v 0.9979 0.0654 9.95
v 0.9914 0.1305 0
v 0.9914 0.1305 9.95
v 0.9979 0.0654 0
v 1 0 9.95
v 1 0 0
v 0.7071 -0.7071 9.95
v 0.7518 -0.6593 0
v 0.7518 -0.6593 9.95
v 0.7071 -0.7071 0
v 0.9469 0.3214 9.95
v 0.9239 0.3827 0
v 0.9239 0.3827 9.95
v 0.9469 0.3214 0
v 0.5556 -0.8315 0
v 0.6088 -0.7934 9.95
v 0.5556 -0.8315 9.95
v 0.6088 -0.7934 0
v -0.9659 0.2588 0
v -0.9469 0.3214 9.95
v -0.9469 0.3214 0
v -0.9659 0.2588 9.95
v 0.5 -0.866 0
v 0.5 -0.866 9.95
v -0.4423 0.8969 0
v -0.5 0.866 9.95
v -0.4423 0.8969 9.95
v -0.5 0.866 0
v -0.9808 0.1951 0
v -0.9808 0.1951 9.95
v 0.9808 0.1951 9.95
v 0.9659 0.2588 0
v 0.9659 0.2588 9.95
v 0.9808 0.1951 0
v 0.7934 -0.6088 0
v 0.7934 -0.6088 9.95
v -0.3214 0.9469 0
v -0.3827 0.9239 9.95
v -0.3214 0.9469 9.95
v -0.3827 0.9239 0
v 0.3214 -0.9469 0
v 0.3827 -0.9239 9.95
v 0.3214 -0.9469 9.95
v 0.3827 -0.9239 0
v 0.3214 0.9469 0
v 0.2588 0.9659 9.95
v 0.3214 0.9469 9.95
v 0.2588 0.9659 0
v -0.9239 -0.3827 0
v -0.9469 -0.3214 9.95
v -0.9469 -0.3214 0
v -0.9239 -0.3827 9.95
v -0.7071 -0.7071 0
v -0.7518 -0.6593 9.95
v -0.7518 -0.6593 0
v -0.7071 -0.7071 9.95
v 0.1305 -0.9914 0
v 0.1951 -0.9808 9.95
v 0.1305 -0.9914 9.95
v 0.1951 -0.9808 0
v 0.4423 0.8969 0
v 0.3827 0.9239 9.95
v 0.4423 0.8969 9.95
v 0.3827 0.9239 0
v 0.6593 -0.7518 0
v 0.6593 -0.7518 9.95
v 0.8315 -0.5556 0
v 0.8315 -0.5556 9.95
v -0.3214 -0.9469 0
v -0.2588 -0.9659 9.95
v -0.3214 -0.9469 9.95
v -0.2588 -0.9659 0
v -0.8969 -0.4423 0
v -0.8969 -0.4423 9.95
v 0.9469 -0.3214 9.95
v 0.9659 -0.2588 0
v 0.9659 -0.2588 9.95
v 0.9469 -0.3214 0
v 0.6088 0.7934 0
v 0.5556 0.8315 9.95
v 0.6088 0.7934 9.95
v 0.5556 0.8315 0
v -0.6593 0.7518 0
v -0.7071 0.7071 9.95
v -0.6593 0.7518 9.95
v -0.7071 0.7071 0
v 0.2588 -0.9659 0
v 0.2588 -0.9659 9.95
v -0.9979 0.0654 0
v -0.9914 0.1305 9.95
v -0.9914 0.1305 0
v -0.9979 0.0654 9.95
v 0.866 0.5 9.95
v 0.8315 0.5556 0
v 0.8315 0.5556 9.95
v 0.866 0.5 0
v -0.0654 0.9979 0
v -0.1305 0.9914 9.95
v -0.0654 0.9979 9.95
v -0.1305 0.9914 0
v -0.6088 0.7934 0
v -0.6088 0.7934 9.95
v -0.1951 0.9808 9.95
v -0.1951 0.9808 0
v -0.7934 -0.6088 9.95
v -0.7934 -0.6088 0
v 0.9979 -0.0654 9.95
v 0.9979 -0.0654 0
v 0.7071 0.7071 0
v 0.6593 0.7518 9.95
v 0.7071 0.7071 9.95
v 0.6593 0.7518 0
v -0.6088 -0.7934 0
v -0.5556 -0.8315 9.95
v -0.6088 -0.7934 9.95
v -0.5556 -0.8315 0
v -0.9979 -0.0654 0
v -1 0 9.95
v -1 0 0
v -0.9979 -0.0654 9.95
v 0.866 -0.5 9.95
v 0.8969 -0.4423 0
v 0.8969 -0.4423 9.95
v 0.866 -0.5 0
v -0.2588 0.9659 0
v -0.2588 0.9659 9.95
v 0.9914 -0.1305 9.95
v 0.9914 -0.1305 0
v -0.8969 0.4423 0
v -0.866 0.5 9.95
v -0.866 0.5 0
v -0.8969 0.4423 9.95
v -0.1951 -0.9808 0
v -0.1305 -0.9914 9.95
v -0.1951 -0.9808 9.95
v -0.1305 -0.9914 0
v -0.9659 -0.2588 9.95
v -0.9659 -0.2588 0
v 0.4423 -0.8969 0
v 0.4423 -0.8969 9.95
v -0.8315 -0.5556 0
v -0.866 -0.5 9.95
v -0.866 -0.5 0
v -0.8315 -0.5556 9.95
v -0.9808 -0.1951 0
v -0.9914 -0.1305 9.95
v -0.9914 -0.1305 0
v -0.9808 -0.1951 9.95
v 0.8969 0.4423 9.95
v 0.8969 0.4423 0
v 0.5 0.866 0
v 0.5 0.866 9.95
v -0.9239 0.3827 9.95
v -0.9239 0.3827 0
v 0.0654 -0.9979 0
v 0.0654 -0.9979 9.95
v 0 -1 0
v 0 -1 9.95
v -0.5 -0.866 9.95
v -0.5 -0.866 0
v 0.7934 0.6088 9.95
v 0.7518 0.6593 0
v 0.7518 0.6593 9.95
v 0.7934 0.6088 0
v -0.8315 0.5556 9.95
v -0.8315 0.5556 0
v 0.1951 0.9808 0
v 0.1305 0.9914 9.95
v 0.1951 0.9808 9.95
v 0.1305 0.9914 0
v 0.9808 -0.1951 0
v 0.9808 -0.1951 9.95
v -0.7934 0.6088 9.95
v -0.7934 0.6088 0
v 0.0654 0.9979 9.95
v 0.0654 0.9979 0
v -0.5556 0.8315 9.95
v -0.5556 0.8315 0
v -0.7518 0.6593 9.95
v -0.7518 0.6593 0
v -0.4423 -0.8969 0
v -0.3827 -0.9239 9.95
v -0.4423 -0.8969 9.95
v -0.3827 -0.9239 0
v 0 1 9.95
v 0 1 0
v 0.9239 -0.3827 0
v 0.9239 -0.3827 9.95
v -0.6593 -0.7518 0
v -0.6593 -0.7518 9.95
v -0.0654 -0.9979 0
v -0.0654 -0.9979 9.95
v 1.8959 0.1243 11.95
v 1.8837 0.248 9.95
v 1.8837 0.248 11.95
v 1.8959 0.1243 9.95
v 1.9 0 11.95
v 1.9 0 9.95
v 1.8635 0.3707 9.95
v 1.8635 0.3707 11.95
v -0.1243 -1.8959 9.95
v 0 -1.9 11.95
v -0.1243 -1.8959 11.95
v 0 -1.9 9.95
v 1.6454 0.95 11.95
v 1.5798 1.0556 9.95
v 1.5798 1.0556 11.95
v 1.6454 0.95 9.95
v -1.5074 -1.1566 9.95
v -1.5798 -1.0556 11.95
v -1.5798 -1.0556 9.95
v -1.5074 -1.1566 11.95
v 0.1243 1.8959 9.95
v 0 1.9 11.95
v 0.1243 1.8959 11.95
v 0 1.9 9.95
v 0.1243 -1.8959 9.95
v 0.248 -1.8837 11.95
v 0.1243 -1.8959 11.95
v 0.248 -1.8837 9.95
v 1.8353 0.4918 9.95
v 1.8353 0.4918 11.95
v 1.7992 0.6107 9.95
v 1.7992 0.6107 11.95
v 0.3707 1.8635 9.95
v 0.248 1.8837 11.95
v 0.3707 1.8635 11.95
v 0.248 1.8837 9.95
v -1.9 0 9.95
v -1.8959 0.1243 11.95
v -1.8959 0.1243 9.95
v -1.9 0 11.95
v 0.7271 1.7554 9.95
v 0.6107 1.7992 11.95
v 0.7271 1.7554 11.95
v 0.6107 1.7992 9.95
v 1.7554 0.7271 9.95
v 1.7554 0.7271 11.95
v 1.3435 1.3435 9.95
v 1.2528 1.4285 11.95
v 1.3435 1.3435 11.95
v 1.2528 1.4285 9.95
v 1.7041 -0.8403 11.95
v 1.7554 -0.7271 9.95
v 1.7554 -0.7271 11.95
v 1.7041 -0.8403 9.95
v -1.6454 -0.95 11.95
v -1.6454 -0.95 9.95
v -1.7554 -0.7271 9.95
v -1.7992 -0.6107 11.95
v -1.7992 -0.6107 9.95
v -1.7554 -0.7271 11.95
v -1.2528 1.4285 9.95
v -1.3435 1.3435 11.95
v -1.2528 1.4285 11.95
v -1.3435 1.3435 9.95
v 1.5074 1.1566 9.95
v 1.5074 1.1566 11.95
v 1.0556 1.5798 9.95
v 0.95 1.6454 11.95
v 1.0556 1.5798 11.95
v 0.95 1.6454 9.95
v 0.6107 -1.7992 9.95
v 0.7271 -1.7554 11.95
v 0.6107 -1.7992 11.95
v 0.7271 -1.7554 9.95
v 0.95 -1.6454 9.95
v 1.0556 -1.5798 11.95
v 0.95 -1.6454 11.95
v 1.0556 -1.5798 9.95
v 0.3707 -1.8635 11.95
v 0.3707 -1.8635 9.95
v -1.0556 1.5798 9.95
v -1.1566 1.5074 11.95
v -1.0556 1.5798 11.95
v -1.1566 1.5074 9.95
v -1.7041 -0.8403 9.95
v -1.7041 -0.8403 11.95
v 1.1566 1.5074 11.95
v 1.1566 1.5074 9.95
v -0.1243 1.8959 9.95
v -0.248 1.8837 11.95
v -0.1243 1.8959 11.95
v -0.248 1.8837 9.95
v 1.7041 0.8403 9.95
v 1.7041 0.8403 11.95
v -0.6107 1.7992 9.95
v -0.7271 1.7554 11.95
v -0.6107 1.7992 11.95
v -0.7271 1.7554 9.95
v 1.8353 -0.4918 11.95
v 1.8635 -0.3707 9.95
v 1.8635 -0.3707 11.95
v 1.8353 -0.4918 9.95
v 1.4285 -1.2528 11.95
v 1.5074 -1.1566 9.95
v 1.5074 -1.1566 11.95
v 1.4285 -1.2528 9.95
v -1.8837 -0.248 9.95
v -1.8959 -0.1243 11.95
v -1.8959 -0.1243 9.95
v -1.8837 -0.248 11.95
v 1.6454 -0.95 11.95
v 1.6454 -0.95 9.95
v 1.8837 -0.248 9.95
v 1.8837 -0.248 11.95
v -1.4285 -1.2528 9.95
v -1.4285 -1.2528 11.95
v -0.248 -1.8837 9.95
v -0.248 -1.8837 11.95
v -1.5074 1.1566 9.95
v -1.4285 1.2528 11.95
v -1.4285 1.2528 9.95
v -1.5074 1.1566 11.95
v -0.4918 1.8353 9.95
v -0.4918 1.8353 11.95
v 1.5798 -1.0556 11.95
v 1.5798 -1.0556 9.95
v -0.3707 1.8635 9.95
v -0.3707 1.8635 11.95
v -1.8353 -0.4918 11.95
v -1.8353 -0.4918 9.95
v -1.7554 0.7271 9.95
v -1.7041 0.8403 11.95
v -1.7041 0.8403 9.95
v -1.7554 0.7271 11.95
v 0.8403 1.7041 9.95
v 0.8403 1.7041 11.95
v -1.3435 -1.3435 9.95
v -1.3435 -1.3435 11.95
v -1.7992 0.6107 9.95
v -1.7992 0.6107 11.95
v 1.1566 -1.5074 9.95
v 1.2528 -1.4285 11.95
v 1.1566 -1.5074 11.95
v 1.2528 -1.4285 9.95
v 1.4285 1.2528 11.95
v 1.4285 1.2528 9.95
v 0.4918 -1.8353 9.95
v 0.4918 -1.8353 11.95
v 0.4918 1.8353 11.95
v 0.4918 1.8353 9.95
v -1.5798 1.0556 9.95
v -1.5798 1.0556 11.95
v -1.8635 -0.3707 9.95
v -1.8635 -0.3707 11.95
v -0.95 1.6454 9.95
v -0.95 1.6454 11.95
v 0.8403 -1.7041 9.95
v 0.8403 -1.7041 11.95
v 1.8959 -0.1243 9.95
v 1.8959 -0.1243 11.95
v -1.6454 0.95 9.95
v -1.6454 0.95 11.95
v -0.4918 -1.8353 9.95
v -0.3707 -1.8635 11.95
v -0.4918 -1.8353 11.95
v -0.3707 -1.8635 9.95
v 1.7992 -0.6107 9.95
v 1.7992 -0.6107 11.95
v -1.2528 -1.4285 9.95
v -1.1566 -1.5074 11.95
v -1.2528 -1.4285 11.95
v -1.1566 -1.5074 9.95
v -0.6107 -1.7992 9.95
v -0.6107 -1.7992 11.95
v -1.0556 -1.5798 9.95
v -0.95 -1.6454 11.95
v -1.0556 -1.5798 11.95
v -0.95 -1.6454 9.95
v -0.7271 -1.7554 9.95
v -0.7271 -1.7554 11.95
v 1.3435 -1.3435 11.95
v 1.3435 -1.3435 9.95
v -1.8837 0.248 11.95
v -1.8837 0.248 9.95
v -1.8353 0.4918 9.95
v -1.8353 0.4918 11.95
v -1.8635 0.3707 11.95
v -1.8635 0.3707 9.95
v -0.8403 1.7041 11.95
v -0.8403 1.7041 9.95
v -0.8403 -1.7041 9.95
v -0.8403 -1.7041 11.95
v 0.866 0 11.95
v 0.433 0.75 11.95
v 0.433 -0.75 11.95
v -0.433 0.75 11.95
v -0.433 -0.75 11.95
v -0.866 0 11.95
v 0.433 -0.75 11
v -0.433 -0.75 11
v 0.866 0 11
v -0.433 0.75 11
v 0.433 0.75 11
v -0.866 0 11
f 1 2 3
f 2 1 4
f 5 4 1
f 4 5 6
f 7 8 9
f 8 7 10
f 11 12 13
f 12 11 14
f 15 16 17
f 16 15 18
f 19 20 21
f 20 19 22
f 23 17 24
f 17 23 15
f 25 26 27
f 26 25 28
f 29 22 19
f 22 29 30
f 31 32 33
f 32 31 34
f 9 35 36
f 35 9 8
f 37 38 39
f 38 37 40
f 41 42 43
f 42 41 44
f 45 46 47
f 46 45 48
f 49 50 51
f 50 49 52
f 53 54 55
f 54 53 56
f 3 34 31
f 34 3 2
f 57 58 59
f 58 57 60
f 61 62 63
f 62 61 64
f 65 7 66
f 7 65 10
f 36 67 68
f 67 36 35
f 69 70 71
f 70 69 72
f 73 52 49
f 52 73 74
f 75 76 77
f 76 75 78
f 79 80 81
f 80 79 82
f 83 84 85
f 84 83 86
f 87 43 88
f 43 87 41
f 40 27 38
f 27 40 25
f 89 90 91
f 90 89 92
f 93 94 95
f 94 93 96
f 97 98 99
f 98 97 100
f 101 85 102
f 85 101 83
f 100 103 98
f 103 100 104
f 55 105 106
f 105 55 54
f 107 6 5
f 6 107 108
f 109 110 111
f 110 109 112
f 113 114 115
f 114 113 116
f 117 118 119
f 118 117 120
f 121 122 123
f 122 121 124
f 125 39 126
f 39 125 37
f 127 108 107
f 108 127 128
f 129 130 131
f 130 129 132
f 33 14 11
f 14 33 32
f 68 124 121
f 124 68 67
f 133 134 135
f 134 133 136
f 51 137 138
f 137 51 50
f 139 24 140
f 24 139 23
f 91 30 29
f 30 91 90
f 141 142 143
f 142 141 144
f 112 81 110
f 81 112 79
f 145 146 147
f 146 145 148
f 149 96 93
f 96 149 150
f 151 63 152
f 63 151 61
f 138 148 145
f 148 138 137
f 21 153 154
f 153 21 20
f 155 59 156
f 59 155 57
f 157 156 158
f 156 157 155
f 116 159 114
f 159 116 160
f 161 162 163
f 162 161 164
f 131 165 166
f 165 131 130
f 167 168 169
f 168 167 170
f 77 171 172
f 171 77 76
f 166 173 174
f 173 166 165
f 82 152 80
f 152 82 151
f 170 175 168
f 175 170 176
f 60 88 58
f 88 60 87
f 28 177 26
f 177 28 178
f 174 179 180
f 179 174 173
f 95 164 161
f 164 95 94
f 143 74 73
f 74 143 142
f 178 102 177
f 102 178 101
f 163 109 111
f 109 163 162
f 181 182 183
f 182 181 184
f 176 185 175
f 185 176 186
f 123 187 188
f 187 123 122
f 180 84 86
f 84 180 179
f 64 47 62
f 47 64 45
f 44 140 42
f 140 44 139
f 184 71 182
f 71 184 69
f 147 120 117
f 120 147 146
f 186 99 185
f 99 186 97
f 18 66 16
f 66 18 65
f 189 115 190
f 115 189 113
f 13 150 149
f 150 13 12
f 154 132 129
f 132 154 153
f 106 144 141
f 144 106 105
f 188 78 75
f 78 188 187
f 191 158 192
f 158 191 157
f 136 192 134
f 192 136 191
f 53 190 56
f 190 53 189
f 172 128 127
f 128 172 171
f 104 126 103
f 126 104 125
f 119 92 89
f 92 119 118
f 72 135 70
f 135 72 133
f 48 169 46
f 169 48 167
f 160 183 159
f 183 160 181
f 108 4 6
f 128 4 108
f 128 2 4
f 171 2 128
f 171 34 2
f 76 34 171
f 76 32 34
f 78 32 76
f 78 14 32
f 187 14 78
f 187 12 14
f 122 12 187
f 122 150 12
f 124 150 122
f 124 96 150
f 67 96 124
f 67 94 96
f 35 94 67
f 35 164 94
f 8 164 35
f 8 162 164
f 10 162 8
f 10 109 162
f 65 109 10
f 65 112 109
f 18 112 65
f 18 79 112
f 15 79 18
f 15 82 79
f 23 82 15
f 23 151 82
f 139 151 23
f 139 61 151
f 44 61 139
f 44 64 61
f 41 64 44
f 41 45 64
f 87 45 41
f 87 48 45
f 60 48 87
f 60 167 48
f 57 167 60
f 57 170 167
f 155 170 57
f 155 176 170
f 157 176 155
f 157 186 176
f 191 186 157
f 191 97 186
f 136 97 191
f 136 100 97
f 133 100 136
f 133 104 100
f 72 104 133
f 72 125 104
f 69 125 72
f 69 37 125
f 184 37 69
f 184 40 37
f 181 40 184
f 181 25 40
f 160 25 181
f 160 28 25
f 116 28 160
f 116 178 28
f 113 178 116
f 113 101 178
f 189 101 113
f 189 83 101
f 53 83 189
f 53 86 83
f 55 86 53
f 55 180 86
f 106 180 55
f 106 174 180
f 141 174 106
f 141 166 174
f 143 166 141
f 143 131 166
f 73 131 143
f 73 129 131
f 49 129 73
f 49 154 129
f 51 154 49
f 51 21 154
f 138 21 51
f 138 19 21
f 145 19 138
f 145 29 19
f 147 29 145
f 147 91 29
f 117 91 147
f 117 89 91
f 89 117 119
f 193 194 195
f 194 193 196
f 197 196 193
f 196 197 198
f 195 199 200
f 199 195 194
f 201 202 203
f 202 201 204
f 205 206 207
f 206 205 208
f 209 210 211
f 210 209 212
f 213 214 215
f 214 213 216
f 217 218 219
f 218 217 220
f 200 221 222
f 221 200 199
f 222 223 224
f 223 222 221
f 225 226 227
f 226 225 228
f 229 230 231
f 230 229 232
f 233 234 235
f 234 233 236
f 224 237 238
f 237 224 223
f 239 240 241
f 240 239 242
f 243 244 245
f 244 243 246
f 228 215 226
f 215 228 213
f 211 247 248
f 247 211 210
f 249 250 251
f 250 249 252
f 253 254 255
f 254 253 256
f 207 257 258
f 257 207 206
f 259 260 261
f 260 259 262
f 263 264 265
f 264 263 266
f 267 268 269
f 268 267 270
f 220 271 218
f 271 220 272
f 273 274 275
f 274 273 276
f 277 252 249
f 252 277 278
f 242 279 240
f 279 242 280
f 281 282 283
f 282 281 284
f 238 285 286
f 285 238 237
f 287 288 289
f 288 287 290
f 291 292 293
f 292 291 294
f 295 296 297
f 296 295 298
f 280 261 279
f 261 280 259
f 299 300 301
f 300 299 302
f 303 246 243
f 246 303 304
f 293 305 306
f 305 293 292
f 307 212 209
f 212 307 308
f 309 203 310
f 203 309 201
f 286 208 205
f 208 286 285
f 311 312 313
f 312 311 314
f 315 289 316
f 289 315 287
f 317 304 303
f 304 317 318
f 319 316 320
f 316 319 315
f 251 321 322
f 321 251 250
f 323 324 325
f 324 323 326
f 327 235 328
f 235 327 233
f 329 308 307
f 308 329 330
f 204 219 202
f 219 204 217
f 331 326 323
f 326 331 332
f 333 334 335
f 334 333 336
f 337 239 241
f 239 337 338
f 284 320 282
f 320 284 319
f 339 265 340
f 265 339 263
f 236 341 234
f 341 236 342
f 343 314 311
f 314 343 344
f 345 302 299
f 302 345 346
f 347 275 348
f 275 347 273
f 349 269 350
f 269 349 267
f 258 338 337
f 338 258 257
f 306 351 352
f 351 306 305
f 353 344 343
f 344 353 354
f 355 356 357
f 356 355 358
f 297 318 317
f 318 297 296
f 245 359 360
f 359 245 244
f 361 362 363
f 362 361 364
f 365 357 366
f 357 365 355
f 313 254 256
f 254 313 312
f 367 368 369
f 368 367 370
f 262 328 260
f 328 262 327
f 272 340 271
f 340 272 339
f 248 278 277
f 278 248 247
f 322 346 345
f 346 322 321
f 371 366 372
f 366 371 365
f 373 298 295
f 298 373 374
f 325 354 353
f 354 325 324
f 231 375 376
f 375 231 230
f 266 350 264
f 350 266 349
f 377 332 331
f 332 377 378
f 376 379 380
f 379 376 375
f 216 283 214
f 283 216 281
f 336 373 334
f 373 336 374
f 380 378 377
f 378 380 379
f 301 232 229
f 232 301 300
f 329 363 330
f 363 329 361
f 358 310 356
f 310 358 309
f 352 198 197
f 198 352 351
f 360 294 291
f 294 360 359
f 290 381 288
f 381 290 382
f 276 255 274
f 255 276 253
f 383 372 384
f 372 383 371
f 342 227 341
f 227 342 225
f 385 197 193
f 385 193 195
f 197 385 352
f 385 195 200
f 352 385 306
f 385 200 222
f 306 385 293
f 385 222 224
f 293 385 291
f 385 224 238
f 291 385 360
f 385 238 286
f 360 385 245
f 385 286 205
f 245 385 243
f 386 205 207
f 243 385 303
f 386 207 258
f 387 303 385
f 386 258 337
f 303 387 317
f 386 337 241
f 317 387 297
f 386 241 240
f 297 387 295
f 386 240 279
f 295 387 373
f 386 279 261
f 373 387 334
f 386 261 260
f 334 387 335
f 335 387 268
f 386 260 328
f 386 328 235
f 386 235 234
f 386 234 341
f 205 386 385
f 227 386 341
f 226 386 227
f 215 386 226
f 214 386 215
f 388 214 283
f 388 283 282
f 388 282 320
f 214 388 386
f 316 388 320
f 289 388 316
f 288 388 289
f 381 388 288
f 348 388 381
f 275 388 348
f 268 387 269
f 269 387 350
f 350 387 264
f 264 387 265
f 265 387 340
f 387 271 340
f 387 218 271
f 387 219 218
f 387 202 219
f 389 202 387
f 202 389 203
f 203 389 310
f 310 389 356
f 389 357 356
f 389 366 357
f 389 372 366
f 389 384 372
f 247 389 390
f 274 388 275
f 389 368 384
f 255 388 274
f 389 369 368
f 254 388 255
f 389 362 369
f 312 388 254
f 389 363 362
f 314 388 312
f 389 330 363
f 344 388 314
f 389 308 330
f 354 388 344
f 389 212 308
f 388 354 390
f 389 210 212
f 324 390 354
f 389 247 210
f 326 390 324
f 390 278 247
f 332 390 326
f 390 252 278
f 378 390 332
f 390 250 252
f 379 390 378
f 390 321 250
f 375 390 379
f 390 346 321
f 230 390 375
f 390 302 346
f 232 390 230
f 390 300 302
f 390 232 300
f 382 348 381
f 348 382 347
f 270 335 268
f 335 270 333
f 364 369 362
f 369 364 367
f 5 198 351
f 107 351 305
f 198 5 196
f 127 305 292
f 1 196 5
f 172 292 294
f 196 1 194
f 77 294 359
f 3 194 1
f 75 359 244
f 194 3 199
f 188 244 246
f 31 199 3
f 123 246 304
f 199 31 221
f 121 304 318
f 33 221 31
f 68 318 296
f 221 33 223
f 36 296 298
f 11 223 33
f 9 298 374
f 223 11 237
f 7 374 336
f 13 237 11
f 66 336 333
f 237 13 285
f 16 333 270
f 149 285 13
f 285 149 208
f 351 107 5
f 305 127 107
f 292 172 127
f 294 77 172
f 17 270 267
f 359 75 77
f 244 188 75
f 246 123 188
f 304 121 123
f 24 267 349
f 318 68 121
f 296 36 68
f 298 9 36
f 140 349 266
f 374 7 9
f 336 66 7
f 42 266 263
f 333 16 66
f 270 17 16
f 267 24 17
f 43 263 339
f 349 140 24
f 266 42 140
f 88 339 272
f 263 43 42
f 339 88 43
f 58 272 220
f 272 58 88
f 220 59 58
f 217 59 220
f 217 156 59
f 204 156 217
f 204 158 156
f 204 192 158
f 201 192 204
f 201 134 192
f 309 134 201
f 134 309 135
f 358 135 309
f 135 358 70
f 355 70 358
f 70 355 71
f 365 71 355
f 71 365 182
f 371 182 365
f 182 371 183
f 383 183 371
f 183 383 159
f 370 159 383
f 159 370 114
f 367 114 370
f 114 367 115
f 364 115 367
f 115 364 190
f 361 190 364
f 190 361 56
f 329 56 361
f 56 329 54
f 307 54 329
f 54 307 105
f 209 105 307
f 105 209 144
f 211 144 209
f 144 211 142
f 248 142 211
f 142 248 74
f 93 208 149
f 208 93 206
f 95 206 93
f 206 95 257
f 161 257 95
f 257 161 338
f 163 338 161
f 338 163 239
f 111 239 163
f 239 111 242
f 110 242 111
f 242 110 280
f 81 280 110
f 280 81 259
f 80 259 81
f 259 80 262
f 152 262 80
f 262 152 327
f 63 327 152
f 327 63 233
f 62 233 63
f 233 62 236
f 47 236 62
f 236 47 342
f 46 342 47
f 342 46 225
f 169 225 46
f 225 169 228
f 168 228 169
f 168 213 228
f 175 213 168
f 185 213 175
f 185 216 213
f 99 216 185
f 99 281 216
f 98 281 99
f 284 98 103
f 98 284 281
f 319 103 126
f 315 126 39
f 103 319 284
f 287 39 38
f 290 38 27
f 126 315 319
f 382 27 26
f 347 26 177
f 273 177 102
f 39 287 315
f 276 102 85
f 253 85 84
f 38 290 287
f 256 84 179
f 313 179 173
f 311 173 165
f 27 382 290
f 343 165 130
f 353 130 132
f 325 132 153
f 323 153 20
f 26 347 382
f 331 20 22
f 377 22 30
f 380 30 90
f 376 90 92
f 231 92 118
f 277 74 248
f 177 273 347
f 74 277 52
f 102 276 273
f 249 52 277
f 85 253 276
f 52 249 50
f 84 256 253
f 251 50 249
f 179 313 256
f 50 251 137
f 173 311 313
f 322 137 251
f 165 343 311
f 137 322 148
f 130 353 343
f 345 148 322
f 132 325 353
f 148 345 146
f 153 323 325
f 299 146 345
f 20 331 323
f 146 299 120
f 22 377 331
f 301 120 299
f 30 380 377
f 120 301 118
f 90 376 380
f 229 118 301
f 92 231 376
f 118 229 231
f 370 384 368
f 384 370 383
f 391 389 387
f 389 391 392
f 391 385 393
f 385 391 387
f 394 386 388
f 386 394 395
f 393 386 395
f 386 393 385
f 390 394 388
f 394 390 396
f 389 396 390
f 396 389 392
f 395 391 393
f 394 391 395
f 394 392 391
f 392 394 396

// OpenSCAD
$fn = 96;

// Target dimensions (mm)
shank_diameter_mm = 2.0;
head_diameter_mm  = 3.8;
length_mm         = 10.0;   // under-head length
head_height_mm    = 2.0;

// Socket (approx for M2)
hex_socket_af_mm      = 1.5;  // across flats
hex_socket_depth_mm   = 1.0;

// Small overlaps to ensure watertight unions/differences
overlap_mm = 0.05;

// Hex prism sized by across-flats (AF)
module hex_prism_af(af, h, center=false) {
    // For a regular hexagon: AF = 2 * apothem, and apothem = R*cos(30)
    // => R (circumradius) = AF / (2*cos(30))
    R = af / (2*cos(30));
    cylinder(h=h, r=R, $fn=6, center=center);
}

module socket_head_cap_screw() {
    // Place head on top of shank: shank spans z=[0, length], head spans z=[length, length+head_height]
    difference() {
        union() {
            // Shank (cylindrical)
            translate([0, 0, length_mm/2])
                cylinder(h=length_mm, r=shank_diameter_mm/2, center=true);

            // Head (cylindrical)
            translate([0, 0, length_mm + head_height_mm/2 - overlap_mm])
                cylinder(h=head_height_mm, r=head_diameter_mm/2, center=true);
        }

        // Hex socket recess cut into head from the top
        // Top of head is at z = length + head_height
        translate([0, 0, length_mm + head_height_mm - hex_socket_depth_mm/2 + overlap_mm])
            hex_prism_af(hex_socket_af_mm, hex_socket_depth_mm + 2*overlap_mm, center=true);
    }
}

socket_head_cap_screw();
